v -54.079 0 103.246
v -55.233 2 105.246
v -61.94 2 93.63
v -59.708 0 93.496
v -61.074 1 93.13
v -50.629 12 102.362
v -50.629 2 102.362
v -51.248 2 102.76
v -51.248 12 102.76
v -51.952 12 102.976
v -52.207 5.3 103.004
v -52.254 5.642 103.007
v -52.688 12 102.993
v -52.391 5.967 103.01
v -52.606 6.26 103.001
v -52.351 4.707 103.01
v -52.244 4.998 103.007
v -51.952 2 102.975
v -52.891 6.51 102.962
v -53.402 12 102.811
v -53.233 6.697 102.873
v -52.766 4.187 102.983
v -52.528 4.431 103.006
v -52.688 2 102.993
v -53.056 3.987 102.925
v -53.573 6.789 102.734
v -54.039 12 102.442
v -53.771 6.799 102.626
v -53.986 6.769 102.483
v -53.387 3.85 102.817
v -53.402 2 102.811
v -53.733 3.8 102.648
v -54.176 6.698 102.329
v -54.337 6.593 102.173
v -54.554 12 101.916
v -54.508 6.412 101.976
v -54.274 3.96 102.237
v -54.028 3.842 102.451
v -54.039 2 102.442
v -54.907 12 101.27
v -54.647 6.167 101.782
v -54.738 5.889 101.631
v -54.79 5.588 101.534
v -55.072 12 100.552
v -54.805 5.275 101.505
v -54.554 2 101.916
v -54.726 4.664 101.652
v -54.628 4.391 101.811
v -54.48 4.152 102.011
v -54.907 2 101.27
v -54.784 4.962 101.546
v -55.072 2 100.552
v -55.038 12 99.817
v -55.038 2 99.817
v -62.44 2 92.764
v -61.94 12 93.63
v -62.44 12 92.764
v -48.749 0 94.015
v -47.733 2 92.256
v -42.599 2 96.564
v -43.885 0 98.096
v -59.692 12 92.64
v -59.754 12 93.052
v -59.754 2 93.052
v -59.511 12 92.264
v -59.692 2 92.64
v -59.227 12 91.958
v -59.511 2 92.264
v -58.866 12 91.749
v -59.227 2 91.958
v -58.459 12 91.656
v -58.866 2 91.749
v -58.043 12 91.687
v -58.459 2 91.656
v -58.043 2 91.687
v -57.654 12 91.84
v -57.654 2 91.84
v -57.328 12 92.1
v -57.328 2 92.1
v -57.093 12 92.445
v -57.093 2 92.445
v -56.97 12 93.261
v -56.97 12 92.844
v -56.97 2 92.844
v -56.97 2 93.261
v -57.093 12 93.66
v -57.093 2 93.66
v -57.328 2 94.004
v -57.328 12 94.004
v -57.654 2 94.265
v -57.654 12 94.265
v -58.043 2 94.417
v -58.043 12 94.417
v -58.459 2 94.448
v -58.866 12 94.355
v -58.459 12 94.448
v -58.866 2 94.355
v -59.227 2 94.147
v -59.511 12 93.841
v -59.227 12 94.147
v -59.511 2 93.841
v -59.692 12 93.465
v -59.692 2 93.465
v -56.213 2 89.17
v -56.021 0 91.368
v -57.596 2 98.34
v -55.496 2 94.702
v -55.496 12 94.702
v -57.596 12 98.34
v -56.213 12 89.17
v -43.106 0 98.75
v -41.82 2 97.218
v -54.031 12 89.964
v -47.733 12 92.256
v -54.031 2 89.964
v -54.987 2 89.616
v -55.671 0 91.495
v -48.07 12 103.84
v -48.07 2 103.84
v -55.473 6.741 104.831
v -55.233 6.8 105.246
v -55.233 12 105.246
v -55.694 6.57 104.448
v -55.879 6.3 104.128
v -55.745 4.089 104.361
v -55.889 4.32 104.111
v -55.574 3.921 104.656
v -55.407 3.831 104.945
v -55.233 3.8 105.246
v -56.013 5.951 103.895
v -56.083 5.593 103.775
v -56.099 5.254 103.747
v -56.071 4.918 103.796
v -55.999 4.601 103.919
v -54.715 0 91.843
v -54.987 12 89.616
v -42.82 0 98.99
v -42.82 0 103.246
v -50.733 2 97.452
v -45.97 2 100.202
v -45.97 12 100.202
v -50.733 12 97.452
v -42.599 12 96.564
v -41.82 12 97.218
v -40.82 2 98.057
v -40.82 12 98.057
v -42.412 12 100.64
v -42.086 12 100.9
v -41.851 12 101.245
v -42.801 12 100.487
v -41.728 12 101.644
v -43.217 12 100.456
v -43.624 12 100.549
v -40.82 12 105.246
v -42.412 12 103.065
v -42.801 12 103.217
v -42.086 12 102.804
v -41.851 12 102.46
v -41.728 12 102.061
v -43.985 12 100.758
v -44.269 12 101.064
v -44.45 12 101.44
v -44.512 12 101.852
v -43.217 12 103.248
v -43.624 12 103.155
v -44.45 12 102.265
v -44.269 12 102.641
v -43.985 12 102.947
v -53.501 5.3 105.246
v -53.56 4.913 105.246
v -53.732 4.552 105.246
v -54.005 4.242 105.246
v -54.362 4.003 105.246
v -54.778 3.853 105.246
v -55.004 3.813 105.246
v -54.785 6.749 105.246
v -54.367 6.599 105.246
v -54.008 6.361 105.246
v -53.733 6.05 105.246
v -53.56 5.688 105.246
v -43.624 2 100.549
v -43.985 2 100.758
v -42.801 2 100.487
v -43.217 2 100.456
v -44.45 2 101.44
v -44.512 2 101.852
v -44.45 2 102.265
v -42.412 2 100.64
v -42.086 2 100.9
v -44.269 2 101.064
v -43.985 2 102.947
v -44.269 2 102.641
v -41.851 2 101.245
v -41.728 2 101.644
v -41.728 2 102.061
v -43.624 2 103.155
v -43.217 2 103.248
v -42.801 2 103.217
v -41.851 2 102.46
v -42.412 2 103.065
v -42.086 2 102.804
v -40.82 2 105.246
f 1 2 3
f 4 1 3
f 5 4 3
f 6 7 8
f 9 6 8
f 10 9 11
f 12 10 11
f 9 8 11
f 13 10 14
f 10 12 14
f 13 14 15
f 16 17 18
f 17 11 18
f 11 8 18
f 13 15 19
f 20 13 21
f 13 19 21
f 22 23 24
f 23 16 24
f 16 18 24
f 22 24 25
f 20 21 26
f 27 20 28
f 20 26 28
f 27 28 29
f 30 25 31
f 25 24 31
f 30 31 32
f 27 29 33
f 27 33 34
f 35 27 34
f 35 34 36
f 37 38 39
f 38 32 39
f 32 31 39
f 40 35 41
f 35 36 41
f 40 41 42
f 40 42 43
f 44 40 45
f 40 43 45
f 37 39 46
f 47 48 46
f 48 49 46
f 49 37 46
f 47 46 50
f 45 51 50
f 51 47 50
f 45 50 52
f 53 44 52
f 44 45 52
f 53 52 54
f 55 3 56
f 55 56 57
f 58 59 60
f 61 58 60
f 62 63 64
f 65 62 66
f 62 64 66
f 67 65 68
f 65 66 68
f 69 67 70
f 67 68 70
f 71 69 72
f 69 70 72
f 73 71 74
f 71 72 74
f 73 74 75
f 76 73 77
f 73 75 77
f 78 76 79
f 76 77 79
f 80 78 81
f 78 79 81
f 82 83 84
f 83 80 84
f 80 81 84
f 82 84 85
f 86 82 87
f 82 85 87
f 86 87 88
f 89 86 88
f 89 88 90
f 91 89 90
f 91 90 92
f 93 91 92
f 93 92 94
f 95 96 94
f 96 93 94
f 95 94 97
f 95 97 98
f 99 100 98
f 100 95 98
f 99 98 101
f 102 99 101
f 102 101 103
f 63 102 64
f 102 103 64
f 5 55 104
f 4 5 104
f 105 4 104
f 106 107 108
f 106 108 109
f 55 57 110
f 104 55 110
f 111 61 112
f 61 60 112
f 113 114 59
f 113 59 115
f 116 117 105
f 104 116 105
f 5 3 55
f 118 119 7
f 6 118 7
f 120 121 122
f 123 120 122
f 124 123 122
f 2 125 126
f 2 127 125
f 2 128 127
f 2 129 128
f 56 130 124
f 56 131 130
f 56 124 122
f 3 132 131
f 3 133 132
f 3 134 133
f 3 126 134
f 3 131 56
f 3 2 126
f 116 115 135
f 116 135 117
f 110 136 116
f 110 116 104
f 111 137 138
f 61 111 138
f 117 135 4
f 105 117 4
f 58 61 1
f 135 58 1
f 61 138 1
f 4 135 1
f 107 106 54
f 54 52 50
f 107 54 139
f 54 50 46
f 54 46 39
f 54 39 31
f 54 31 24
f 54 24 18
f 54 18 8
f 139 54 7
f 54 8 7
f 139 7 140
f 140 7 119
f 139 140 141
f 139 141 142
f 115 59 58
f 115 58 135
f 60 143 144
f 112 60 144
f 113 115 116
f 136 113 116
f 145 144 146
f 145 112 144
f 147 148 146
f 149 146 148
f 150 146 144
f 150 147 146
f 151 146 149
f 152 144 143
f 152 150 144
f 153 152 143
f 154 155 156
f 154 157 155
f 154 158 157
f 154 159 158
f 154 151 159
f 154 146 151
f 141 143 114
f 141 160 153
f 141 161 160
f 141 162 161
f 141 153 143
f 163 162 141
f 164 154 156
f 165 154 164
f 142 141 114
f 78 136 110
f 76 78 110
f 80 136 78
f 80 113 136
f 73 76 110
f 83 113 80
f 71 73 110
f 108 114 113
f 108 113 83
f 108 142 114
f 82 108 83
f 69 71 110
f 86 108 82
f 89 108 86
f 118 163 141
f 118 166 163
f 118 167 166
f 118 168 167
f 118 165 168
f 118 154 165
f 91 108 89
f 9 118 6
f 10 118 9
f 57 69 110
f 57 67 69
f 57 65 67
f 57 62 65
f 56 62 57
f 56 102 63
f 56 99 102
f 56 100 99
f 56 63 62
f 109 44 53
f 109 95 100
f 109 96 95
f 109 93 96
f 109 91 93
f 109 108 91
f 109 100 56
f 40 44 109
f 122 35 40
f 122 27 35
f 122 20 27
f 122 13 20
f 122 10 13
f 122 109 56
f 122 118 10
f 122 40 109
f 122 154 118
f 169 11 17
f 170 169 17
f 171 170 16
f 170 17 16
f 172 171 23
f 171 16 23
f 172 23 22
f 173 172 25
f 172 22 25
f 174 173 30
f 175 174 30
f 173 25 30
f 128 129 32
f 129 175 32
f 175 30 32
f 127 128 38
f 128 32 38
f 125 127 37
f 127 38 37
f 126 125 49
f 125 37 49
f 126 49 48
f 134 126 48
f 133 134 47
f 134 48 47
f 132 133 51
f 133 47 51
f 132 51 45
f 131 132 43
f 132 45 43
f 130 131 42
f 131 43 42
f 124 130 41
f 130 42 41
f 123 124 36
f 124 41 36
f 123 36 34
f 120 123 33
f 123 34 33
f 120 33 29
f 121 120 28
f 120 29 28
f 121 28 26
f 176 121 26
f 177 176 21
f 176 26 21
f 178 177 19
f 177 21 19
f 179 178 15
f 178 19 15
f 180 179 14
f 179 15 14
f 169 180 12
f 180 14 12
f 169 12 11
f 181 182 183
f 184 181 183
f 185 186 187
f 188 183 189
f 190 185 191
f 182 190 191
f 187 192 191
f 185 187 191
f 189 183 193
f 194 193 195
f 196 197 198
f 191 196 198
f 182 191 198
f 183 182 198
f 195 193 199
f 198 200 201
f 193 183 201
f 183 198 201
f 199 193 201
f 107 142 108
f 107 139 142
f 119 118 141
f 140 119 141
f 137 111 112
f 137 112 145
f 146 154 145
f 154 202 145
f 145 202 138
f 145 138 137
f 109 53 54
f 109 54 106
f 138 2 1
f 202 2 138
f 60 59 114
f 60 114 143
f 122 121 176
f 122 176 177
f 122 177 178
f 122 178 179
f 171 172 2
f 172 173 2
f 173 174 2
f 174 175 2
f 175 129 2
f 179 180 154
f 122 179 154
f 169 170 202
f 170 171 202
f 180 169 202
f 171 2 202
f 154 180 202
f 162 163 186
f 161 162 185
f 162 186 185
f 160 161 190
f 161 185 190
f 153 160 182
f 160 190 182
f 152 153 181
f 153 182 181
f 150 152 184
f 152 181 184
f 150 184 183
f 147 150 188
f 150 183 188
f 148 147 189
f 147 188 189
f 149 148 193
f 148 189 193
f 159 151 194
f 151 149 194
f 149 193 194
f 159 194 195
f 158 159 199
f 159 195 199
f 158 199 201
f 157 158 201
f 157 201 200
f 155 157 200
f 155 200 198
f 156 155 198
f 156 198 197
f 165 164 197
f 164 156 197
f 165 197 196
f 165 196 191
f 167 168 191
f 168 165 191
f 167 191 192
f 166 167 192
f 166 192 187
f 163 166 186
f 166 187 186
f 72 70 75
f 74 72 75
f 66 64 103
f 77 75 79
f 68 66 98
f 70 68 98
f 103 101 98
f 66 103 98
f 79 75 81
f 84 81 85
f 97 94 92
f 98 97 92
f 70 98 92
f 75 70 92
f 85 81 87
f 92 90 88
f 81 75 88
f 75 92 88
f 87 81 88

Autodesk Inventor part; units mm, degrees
ref_plane "YZ Plane" through (0, 0, 0) normal (1, 0, 0) x (0, 1, 0)
ref_plane "XZ Plane" through (0, 0, 0) normal (0, 1, 0) x (-1, 0, 0)
ref_plane "XY Plane" through (0, 0, 0) normal (0, 0, 1) x (1, 0, 0)
sketch "Sketch1" plane through (0, 0, 0) normal (0, 1, 0) x (-1, 0, 0)
  line L0 (50.7332, 97.4522) -> (55.4964, 94.7022)
  line L1 (55.4964, 94.7022) -> (57.5964, 98.3395)
  line L2 (48.0701, 103.8395) -> (45.9701, 100.2022)
  line L3 (45.9701, 100.2022) -> (50.7332, 97.4522)
  arc A0 (55.0378, 99.8167) -> (50.6287, 102.3623) centre (52.3832, 100.3101) ccw
  line L4 (48.0701, 103.8395) -> (50.6287, 102.3623)
  line L5 (55.0378, 99.8167) -> (57.5964, 98.3395)
  line L6 (47.7332, 92.256) -> (54.0309, 89.9639)
  line L7 (47.7332, 92.256) -> (54.435, 92.256) construction
  line L8 (56.5464, 96.5209) -> (59.5464, 96.5209) construction
  line L9 (58.0464, 93.9228) -> (60.2464, 93.9228) construction
  line L10 (54.0309, 89.9639) -> (54.9868, 89.616)
  line L11 (55.2332, 105.2464) -> (61.9398, 93.6303)
  circle A1 centre (58.3542, 93.0522) radius 1.4
  line L12 (61.9398, 93.6303) -> (62.4398, 92.7643)
  line L13 (62.4398, 92.7643) -> (56.2134, 89.1695)
  line L14 (54.9868, 89.616) -> (56.2134, 89.1695)
  line L15 (47.7332, 92.256) -> (42.5993, 96.5639)
  line L16 (47.7332, 92.256) -> (44.3823, 98.06) construction
  line L17 (47.0201, 102.0209) -> (45.5201, 104.6189) construction
  line L18 (44.0201, 102.0209) -> (42.9201, 103.9261) construction
  line L19 (42.5993, 96.5639) -> (41.8201, 97.2178)
  line L20 (55.2332, 105.2464) -> (41.8201, 105.2464)
  circle A2 centre (43.1122, 101.8522) radius 1.4
  line L21 (41.8201, 105.2464) -> (40.8201, 105.2464)
  line L22 (40.8201, 105.2464) -> (40.8201, 98.0569)
  line L23 (41.8201, 97.2178) -> (40.8201, 98.0569)
  dimension "d8" = 20
  dimension "d26" = 2.8
  dimension "d27" = 1
  dimension "d31" = 2.8
extrude "Extrusion1" add sketch "Sketch1" along normal blind 12
sketch "Sketch3" plane through (0, 0, 0) normal (0, -1, 0) x (1, 0, 0)
  line L0 (-48.0701, 103.8395) -> (-45.9701, 100.2022) projected
  line L1 (-45.9701, 100.2022) -> (-55.4964, 94.7022) projected
  line L2 (-55.4964, 94.7022) -> (-57.5964, 98.3395) projected
  line L3 (-57.5964, 98.3395) -> (-55.0378, 99.8167) projected
  arc A0 (-50.6287, 102.3623) -> (-55.0378, 99.8167) centre (-52.3832, 100.3101) ccw projected
  line L4 (-50.6287, 102.3623) -> (-48.0701, 103.8395) projected
  line L5 (-55.2332, 105.2464) -> (-62.4398, 92.7643) projected
  line L6 (-56.2134, 89.1695) -> (-47.7332, 92.256) projected
  line L7 (-62.4398, 92.7643) -> (-56.2134, 89.1695) projected
  line L8 (-47.7332, 92.256) -> (-40.8201, 98.0569) projected
  line L9 (-40.8201, 98.0569) -> (-40.8201, 105.2464) projected
  line L10 (-40.8201, 105.2464) -> (-55.2332, 105.2464) projected
  circle A1 centre (-58.3542, 93.0522) radius 1.4 projected
  circle A2 centre (-43.1122, 101.8522) radius 1.4 projected
  point P0 (0, 0)
extrude "Extrusion2" add sketch "Sketch3" against normal blind 2 contours L0 L1 L2 L3 A0 L4 | A1 | A2
sketch "Sketch4" plane through (-45.9701, 2, 100.2022) normal (-0.5, 0, 0.8660254) x (0.8660254, 0, 0.5)
  line L0 (0, 0) -> (-5.5, 0)
  line L1 (-11, 0) -> (0, 0) projected
  line L2 (-5.5, 0) -> (-5.5, 3.3)
  circle A0 centre (-5.5, 3.3) radius 1.5
  point P0 (-10.2898, -2)
  dimension "d21" = 3.3
  dimension "d22" = 3
extrude "Extrusion3" cut sketch "Sketch4" along normal through all
chamfer "Chamfer2" distance 2 angle 45 6 edges at (-58.8365, 0, 99.0054) (-48.0267, 0, 105.2464) (-40.8201, 0, 101.6516) (-44.2767, 0, 95.1565) (-51.9733, 0, 90.7128) (-59.3266, 0, 90.9669)
properties part number "TSOP Holder Corner" material "ABS Plastic"
